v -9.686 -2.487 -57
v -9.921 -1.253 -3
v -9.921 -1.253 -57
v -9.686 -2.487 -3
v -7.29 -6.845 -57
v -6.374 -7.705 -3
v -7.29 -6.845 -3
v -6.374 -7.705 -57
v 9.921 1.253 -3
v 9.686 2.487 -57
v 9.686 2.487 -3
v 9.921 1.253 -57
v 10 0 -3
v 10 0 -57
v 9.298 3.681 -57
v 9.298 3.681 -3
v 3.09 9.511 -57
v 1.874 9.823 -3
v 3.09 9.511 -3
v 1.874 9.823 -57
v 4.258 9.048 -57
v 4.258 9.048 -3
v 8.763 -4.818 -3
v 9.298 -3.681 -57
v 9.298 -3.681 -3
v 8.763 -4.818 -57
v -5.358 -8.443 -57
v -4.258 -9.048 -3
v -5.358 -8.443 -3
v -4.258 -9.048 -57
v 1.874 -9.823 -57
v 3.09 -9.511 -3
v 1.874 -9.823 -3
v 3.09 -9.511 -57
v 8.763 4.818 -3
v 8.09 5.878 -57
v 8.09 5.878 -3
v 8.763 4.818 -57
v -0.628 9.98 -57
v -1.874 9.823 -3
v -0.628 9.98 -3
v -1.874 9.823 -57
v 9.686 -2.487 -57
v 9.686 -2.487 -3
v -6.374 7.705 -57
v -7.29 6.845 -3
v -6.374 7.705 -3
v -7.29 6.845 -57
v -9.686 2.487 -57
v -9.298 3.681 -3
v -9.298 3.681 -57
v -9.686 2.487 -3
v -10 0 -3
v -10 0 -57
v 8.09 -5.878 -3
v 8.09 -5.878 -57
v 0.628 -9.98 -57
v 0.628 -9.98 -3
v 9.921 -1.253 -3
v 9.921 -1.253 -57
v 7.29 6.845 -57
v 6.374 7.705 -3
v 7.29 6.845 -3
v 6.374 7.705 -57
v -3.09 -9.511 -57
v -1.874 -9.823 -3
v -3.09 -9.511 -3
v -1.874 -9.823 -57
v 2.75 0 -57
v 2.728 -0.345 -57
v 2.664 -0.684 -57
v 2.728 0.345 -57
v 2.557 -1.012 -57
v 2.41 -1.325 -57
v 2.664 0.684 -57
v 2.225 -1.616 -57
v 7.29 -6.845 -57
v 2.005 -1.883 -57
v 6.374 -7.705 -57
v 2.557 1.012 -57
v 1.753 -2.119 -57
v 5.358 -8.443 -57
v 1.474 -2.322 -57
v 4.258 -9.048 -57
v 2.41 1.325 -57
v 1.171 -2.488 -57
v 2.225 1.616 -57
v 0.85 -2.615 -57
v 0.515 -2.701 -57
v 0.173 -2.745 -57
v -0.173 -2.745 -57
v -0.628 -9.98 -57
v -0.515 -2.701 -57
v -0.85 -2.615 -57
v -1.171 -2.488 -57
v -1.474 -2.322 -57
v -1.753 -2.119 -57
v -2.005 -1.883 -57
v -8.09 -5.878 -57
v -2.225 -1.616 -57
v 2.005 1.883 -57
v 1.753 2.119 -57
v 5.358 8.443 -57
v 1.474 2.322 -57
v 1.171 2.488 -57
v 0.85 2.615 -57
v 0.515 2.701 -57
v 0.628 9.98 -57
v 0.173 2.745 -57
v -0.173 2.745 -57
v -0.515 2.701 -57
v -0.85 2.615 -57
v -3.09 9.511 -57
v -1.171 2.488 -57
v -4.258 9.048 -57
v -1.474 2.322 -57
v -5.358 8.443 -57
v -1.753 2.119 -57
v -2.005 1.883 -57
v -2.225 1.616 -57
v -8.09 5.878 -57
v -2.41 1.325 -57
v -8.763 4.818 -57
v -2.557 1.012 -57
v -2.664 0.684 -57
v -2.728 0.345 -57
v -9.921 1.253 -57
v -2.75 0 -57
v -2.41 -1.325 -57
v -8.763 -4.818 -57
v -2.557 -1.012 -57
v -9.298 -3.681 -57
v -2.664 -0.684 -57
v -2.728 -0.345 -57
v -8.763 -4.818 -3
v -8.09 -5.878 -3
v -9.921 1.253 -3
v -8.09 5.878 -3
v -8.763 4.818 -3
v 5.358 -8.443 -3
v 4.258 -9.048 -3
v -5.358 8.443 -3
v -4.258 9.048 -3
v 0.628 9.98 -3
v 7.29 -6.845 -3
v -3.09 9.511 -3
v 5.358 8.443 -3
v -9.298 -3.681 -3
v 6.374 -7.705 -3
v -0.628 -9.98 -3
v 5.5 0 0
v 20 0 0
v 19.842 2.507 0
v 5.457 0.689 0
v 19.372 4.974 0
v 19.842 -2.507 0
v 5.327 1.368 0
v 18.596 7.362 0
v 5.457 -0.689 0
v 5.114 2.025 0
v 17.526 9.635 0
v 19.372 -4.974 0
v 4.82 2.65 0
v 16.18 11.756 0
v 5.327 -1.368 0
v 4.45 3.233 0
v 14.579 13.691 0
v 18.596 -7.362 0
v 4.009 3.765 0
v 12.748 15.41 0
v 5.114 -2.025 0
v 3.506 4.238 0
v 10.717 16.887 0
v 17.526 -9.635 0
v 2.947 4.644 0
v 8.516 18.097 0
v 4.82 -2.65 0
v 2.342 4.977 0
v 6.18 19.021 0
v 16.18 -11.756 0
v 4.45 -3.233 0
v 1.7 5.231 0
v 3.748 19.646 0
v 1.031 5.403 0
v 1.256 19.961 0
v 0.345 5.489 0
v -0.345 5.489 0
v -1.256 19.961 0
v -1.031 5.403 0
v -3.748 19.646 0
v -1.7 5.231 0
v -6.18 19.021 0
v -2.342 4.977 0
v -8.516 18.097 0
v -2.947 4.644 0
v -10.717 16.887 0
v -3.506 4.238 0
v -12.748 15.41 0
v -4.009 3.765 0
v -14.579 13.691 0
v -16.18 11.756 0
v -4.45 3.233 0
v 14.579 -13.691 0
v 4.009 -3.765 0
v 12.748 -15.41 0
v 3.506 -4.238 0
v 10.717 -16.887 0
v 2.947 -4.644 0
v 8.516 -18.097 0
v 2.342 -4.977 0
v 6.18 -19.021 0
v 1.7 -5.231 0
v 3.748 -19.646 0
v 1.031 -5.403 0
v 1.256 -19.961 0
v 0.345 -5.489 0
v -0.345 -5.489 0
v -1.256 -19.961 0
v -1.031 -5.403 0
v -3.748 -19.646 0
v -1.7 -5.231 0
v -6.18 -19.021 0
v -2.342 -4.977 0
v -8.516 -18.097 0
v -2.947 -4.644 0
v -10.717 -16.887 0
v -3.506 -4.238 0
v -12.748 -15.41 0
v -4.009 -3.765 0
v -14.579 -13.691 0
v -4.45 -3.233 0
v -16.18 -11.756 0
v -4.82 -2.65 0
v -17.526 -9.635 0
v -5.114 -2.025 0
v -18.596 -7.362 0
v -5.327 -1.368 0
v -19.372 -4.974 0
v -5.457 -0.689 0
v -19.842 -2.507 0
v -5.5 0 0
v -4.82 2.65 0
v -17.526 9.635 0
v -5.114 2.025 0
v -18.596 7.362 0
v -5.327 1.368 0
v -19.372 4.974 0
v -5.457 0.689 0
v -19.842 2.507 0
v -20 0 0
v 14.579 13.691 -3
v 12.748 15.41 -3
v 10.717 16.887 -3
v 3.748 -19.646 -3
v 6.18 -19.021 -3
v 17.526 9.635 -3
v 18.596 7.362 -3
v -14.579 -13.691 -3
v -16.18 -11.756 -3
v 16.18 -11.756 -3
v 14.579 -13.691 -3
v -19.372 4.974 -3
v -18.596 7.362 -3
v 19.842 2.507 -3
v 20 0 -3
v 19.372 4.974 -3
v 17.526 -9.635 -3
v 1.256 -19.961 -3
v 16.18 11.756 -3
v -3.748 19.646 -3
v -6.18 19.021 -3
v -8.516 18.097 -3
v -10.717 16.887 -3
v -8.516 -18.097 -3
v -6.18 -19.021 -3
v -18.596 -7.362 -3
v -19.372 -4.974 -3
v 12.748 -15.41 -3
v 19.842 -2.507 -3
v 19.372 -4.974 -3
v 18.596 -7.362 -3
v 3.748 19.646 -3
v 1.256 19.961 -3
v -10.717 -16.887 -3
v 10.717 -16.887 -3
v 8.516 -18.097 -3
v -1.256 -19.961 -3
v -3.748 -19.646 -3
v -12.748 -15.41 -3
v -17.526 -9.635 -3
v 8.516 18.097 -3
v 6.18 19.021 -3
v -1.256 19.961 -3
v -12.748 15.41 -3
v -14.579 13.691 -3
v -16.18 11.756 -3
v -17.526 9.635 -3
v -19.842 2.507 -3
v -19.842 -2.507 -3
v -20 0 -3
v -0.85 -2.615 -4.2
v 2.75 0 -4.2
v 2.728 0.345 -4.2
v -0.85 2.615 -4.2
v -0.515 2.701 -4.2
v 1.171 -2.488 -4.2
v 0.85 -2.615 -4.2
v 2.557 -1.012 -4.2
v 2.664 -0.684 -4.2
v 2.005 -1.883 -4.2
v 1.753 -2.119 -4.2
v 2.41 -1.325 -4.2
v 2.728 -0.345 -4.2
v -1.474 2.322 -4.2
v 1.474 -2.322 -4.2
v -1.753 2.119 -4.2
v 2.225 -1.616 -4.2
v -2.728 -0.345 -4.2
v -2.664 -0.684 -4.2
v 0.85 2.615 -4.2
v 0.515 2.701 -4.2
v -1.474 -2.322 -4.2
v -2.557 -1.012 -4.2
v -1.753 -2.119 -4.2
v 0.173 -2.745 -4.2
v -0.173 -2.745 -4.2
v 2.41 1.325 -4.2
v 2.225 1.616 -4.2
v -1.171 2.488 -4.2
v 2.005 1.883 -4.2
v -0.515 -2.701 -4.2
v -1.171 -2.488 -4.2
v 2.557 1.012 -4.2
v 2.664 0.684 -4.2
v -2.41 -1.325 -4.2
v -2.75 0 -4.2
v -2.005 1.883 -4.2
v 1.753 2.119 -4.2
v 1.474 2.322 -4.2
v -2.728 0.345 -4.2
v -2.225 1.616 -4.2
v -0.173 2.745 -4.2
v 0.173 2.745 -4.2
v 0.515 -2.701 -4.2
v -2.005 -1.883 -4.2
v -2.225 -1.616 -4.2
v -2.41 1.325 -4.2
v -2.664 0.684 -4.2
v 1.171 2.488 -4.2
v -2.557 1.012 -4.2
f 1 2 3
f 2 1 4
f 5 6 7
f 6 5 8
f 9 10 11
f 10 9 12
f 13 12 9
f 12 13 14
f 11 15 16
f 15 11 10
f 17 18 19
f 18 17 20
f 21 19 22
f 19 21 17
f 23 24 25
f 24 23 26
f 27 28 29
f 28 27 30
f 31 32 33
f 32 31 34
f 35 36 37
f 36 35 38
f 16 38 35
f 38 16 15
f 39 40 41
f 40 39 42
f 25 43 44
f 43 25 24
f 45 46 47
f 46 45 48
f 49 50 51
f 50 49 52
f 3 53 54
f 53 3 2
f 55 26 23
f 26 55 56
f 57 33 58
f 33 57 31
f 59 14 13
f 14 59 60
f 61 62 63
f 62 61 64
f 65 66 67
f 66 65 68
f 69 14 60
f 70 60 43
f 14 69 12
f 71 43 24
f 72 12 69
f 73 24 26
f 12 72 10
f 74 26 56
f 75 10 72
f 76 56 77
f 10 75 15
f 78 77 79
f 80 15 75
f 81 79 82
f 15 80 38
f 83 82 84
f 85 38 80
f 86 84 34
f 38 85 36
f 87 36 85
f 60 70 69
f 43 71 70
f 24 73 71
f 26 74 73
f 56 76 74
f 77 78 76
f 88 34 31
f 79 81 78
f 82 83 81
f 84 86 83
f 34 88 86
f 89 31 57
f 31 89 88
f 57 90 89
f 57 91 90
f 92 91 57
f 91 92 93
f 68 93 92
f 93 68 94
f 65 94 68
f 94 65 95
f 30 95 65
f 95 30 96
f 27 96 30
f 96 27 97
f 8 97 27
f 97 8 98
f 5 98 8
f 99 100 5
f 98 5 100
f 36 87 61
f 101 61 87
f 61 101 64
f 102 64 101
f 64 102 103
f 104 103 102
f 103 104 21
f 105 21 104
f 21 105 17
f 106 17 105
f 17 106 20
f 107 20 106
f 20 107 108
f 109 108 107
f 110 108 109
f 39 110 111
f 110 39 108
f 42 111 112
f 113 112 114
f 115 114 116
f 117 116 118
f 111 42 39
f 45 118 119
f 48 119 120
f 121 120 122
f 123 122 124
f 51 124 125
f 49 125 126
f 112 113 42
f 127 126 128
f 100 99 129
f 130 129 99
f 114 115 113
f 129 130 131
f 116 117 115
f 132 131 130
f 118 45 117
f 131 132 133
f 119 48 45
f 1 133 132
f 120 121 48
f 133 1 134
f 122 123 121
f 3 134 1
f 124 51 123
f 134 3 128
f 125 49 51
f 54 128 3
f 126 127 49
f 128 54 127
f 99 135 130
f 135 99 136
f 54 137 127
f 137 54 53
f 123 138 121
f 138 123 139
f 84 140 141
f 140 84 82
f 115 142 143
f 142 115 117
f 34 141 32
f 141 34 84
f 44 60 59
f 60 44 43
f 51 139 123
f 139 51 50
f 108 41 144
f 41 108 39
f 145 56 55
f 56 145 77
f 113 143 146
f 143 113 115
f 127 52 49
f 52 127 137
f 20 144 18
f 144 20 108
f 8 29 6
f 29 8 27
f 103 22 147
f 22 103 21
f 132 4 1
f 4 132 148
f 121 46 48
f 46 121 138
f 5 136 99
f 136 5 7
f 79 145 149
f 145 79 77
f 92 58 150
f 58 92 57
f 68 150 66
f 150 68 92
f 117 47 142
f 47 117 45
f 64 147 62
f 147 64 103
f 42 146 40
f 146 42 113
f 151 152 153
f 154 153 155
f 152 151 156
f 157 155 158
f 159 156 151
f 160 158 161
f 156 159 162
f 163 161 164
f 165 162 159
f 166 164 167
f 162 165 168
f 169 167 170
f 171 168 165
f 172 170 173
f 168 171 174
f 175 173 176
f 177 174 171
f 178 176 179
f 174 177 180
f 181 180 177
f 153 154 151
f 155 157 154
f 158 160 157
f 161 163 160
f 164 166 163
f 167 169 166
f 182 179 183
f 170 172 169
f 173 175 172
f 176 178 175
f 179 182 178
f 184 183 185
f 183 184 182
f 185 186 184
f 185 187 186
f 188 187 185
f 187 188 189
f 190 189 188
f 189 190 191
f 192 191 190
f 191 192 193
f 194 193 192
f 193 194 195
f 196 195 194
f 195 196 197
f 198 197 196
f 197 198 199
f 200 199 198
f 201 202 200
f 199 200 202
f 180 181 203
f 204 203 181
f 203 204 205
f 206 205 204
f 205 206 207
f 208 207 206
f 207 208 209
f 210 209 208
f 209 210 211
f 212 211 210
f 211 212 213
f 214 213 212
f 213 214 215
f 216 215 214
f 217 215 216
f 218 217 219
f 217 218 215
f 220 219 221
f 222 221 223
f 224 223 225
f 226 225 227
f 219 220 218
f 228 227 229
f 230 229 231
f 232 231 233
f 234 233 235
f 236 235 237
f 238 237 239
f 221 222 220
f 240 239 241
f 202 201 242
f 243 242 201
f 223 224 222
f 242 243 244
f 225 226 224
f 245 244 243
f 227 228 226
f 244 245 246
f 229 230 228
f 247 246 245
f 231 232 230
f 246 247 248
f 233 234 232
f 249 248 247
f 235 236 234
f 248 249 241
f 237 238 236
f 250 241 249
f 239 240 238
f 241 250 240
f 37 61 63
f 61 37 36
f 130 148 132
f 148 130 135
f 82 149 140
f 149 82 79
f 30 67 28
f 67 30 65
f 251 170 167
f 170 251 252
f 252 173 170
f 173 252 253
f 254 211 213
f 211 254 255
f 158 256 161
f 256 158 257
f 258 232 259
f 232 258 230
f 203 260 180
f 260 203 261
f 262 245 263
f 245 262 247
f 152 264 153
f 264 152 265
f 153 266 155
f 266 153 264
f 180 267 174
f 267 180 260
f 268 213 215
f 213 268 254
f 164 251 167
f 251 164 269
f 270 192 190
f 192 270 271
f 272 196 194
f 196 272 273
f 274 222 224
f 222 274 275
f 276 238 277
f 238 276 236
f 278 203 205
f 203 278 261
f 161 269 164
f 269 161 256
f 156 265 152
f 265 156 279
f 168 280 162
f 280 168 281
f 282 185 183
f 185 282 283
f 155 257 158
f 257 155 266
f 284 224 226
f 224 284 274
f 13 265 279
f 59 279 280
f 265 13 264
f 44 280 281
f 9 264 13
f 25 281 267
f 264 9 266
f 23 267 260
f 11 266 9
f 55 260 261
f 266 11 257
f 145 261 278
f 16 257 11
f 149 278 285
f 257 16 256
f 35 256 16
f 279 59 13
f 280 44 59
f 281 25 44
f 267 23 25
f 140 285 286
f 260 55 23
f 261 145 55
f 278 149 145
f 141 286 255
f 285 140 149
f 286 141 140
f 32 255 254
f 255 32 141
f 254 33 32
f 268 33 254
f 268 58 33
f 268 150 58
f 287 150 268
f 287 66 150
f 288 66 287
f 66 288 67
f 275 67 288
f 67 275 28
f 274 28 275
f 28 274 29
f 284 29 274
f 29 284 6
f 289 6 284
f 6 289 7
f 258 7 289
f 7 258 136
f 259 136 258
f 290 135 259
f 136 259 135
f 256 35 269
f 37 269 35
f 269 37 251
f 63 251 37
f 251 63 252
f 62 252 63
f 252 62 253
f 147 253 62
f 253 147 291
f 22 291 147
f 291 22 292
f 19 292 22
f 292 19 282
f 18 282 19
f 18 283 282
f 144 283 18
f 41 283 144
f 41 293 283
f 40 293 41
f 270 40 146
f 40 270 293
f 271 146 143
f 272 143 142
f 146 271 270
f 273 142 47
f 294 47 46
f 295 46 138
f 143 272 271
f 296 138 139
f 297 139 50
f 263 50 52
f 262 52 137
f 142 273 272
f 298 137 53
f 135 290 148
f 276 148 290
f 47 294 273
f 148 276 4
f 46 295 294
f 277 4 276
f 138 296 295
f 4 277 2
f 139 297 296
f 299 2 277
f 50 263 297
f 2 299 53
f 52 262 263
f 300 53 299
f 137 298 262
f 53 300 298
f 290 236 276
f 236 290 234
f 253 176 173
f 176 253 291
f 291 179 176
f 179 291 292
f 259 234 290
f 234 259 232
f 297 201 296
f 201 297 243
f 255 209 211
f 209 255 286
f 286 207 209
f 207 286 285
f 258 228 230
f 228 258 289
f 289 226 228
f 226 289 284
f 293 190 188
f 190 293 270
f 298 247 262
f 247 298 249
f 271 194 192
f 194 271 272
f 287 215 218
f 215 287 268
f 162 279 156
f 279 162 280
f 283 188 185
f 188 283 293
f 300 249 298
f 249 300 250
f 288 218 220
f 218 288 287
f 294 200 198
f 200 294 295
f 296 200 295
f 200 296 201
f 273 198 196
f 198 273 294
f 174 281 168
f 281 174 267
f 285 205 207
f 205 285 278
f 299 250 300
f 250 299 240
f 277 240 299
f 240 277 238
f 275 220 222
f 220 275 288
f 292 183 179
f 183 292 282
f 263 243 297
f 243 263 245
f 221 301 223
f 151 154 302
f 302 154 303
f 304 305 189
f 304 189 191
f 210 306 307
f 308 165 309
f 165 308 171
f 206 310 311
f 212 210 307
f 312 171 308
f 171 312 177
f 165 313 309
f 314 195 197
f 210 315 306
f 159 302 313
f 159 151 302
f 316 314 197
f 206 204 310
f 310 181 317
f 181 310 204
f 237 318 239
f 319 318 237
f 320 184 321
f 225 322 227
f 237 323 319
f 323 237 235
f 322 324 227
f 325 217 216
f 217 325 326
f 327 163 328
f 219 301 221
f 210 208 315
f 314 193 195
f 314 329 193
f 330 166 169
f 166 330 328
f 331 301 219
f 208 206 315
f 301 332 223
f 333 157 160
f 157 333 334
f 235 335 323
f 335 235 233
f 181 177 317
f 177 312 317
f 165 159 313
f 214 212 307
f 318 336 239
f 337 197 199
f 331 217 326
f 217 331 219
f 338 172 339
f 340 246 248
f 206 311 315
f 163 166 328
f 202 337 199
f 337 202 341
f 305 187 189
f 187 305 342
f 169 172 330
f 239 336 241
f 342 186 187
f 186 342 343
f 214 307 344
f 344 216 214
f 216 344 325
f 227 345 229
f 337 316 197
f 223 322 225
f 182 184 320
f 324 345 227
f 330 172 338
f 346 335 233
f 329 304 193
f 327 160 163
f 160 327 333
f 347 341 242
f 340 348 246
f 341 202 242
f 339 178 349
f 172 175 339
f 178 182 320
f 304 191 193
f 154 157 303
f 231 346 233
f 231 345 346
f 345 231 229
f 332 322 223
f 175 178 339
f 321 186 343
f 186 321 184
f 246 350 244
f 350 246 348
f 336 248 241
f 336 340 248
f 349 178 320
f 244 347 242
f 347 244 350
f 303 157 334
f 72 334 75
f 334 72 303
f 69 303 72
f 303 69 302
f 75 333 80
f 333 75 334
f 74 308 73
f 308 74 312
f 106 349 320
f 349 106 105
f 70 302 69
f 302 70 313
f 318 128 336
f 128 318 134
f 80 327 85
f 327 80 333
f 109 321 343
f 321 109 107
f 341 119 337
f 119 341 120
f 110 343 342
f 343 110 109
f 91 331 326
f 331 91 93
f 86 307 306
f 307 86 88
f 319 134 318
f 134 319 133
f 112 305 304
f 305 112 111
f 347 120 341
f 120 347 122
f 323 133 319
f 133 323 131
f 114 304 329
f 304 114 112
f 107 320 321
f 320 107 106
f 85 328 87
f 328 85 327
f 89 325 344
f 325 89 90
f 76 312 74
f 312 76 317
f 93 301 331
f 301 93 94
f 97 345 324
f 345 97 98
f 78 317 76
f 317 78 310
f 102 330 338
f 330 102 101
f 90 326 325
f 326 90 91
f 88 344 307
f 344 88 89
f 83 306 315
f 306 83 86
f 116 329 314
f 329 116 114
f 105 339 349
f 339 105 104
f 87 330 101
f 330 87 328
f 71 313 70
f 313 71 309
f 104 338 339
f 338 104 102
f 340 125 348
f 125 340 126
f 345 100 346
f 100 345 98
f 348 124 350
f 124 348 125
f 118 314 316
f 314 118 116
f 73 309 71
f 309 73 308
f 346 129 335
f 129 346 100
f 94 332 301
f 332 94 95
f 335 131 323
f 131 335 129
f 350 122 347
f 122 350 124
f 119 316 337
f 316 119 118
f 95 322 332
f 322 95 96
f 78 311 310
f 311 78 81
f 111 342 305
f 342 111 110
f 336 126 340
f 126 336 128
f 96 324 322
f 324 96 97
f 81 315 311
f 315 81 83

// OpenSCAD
$fn = 50;


difference() {
	union() {
		translate(v = [0, 0, -57.0000000000]) {
			cylinder(h = 57, r = 10.0000000000);
		}
		translate(v = [0, 0, -3.0000000000]) {
			cylinder(h = 3, r = 20.0000000000);
		}
	}
	union() {
		translate(v = [0, 0, 0]) {
			rotate(a = [0, 0, 0]) {
				difference() {
					union() {
						#translate(v = [0, 0, -57.0000000000]) {
							cylinder(h = 57, r = 2.2500000000);
						}
						#translate(v = [0, 0, -4.2000000000]) {
							cylinder(h = 4.2000000000, r = 10.0000000000, r1 = 2.7500000000, r2 = 5.5000000000);
						}
						#translate(v = [0, 0, -57.0000000000]) {
							cylinder(h = 57, r = 2.7500000000);
						}
						#translate(v = [0, 0, -57.0000000000]) {
							cylinder(h = 57, r = 2.2500000000);
						}
					}
					union();
				}
			}
		}
	}
}
